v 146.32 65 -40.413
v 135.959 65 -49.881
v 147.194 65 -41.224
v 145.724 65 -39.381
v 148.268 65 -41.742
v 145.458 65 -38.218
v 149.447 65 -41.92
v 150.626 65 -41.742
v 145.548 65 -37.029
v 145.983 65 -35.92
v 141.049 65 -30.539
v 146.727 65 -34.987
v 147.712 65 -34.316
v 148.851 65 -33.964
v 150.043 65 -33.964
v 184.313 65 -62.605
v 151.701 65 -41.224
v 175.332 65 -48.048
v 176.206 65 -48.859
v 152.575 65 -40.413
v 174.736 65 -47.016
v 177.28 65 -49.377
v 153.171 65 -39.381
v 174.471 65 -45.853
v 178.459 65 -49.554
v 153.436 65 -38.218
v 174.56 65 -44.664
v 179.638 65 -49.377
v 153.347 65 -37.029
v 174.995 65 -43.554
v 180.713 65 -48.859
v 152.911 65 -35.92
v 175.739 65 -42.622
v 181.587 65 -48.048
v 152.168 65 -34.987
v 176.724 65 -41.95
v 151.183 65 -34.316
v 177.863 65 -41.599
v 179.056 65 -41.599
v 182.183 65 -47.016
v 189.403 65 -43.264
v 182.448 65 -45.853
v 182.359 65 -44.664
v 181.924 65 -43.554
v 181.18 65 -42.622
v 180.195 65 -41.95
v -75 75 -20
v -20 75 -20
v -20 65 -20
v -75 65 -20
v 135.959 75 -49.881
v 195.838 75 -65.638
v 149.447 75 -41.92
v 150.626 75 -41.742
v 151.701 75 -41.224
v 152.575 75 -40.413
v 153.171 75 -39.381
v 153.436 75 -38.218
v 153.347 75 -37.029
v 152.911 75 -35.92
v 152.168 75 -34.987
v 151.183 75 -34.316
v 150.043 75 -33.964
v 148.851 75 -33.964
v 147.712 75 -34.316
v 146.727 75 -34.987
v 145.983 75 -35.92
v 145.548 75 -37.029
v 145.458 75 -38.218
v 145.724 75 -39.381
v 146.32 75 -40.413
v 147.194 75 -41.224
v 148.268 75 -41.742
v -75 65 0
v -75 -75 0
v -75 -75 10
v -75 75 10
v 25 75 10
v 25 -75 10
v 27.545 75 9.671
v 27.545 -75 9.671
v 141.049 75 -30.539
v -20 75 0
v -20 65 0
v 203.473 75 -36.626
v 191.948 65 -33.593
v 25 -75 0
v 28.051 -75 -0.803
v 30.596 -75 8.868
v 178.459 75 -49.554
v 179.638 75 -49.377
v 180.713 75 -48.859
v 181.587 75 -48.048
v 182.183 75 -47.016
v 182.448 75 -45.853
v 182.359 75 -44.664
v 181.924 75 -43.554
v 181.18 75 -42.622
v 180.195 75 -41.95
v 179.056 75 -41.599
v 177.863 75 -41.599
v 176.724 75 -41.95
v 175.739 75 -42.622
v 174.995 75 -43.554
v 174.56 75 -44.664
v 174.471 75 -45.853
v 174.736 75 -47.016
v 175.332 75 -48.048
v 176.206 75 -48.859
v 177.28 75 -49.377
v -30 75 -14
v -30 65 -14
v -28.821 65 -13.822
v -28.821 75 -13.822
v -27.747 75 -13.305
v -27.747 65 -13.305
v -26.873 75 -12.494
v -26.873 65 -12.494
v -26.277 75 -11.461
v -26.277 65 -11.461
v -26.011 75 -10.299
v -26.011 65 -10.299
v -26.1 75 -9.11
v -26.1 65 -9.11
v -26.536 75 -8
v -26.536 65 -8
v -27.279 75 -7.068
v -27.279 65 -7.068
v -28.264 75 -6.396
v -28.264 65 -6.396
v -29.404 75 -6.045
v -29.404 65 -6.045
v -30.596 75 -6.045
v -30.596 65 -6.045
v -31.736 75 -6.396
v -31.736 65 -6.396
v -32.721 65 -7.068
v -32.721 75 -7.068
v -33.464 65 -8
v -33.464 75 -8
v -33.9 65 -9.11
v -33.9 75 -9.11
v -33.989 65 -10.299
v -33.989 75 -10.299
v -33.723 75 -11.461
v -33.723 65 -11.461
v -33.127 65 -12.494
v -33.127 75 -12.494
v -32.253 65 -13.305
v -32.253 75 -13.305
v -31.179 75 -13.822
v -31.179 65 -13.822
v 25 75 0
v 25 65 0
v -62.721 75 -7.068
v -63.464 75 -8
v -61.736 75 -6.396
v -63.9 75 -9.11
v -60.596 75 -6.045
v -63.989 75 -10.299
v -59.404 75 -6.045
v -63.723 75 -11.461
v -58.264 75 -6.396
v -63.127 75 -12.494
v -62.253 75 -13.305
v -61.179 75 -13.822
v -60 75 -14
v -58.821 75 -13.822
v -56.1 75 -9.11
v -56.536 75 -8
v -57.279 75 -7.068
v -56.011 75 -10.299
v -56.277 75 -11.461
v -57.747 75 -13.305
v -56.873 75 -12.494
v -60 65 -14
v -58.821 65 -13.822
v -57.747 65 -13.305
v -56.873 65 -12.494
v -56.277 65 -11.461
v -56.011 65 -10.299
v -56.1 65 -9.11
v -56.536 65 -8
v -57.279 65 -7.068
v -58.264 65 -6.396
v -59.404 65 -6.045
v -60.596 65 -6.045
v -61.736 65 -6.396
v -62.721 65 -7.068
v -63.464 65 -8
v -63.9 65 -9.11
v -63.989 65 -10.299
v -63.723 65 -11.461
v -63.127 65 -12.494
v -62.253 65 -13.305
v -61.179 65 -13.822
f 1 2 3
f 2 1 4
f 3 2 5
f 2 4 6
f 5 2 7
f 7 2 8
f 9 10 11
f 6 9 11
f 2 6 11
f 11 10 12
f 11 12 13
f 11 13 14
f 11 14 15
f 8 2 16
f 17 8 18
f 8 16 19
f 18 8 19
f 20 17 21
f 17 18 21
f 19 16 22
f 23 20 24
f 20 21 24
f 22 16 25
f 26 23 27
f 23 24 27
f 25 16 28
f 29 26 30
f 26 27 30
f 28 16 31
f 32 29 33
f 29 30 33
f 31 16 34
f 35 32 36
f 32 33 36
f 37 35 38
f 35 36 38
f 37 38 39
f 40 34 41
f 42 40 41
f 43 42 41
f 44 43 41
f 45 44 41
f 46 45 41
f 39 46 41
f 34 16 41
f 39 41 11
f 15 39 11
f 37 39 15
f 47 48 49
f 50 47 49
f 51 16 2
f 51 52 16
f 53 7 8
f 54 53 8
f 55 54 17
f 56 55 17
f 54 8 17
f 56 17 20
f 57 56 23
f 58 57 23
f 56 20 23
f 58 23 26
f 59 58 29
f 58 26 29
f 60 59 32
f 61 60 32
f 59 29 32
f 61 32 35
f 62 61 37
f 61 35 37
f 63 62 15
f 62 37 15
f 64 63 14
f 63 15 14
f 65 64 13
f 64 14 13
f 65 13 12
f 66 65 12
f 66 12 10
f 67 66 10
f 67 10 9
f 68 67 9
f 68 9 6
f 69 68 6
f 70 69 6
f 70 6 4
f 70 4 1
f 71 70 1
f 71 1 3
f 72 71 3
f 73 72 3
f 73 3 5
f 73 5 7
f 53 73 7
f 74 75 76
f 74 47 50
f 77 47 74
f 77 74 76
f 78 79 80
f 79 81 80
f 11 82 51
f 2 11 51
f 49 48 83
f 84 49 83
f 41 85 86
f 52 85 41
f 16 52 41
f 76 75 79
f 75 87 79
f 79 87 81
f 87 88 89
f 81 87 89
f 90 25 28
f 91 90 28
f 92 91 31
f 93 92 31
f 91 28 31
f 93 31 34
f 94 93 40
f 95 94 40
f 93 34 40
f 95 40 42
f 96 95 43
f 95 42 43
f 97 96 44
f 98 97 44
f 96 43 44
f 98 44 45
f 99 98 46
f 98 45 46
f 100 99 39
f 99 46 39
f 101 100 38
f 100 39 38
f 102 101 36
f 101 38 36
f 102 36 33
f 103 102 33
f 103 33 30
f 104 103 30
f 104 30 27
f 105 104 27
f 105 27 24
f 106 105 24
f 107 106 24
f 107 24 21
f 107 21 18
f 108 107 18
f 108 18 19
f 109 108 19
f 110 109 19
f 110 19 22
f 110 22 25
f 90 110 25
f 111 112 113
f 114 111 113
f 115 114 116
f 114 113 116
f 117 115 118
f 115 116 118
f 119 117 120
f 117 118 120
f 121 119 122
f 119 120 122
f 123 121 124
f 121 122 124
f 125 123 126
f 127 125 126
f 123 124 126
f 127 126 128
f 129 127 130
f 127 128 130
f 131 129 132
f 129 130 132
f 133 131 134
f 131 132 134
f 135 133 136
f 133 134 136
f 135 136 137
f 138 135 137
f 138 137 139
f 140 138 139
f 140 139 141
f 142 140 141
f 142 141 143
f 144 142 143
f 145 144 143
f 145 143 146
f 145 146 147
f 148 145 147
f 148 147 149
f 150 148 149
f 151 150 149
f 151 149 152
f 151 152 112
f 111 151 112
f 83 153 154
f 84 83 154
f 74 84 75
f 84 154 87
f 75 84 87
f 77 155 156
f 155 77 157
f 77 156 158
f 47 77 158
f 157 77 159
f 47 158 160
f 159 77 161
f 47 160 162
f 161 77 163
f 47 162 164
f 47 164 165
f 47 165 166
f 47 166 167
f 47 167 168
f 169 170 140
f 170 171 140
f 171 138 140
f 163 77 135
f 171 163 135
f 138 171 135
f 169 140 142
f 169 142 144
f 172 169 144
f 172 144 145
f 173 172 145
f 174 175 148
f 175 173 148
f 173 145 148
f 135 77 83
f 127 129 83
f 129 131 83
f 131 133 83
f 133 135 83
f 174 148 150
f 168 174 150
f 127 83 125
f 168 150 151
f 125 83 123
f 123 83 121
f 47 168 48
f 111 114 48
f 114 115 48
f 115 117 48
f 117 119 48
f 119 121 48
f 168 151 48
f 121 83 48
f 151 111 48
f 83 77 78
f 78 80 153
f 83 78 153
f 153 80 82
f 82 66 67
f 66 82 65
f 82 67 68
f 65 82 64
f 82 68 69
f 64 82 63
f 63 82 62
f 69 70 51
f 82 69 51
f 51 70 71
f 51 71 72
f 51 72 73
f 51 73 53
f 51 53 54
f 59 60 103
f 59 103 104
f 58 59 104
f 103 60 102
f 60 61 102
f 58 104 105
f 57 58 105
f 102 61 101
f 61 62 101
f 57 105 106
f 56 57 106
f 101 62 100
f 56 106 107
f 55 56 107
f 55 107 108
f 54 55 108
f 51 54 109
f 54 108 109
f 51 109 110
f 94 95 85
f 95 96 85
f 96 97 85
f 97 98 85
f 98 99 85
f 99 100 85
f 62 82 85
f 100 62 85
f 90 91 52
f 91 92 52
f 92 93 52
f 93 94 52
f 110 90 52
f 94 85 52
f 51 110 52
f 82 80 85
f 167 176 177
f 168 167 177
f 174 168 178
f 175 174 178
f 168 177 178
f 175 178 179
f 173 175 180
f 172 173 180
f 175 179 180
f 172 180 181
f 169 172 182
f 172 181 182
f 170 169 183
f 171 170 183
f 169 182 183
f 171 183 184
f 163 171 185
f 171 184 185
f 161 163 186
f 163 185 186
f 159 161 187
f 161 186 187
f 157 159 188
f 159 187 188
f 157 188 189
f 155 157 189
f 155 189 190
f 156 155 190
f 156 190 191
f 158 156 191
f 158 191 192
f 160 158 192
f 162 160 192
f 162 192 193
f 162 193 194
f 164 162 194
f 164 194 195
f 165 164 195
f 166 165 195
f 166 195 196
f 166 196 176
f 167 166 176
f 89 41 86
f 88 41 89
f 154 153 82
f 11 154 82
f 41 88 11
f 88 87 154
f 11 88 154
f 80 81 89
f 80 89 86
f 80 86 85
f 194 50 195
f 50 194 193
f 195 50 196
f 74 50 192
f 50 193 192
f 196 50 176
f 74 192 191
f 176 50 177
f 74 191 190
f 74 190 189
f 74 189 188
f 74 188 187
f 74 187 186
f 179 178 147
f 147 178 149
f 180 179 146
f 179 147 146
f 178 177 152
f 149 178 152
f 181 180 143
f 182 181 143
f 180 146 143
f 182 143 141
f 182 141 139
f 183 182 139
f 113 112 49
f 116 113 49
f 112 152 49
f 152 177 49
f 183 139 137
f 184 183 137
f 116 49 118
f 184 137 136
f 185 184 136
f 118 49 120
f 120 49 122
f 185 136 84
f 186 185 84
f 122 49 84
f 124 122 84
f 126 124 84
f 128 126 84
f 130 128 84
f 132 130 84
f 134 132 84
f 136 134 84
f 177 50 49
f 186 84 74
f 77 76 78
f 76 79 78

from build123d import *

# Parameters (mm, degrees)
SKETCH_1_W          = 50
SKETCH_1_H          = 150
EXTRUDE_1_DEPTH     = 10
SKETCH_3_W          = 10
SKETCH_3_H          = 150
EXTRUDE_2_DEPTH     = 280
EXTRUDE_3_DEPTH     = 10
CUT_EXTRUDE_1_DEPTH = 50
EXTRUDE_4_DEPTH     = 50
SKETCH_9_R          = 4
CUT_EXTRUDE_2_DEPTH = 30
CUT_EXTRUDE_4_DEPTH = 10


with BuildPart() as part:
    # 草图1 → 凸台-拉伸1 (new body)
    with BuildSketch(Plane.XY):
        Rectangle(SKETCH_1_W, SKETCH_1_H)
    extrude(amount=EXTRUDE_1_DEPTH)



with BuildPart() as body_2:
    # 草图3 → 凸台-拉伸2 (new body)
    with BuildSketch(Plane(origin=(25, 75, 0), x_dir=(-0.2544932992796438, 0, -0.9670745372626465), z_dir=(0.9670745372626465, 0, -0.2544932992796438))):
        with Locations((-5, -75)):
            Rectangle(SKETCH_3_W, SKETCH_3_H)
    extrude(amount=EXTRUDE_2_DEPTH)


with BuildPart() as part_1:
    add(part.part)

    add(body_2.part)  # 放样8 merges body 2
    # 草图4 → 放样8 section 0
    with BuildSketch(Plane(origin=(25, 0, 0), x_dir=(0, 0, -1), z_dir=(1, 0, 0))):
        with BuildLine():
            Line((-10, 75), (0, 75))
            Line((0, 75), (0, -75))
            Line((0, -75), (-10, -75))
            Line((-10, -75), (-10, 75))
        make_face()
    # 草图5 → 放样8 section 1
    with BuildSketch(Plane(origin=(23.380829016, 0, -6.152849741), x_dir=(0.25449329927964376, 0, 0.9670745372626466), z_dir=(-0.9670745372626466, 0, 0.25449329927964376))):
        with BuildLine():
            Line((6.362332482, 75), (16.362332482, 75))
            Line((16.362332482, 75), (16.362332482, -75))
            Line((16.362332482, -75), (6.362332482, -75))
            Line((6.362332482, -75), (6.362332482, 75))
        make_face()
    loft()

    # 草图6 → 凸台-拉伸3 (add)
    with BuildSketch(Plane(origin=(0, 75, 0), x_dir=(1, 0, 0), z_dir=(0, 1, 0))):
        Polygon((25, 0), (295.780870434, 71.258123798), (290.691004448, 90.599614544), (22.412469182, 20), (-25, 20), (-25, 0), align=None)
    extrude(amount=-EXTRUDE_3_DEPTH)

    # 草图7 → 切除-拉伸1 (cut, symmetric)
    with BuildSketch(Plane(origin=(1.619170984, 0, 6.152849741), x_dir=(-0.9670745372626465, 0, 0.2544932992796438), z_dir=(-0.2544932992796438, 0, -0.9670745372626465))):
        Polygon((-194.176863432, 65), (-24.176863432, -77.6469373), (26.721796424, -75), (44.26157498, -115.472113567), (-316.323525899, -105.286880986), (-321.035103343, 79.29609417), (-302.302762067, 102.681692196), (-235.315396996, 89.416867429), (-227.148078723, 92.666134591), align=None)
    extrude(amount=CUT_EXTRUDE_1_DEPTH, both=True, mode=Mode.SUBTRACT)

    # 草图8 → 凸台-拉伸4 (add)
    with BuildSketch(Plane.ZY.offset(25)):
        Polygon((0, 65), (0, -75), (10, -75), (10, 75), (-20, 75), (-20, 65), align=None)
    extrude(amount=EXTRUDE_4_DEPTH)

    # 草图9 → 切除-拉伸2 (cut)
    with BuildSketch(Plane.XZ.offset(-65)):
        with Locations(Location((-60, -10, 0), (0, 0, 270))):
            Circle(SKETCH_9_R)
        with Locations(Location((-30, -10, 0), (0, 0, 270))):
            Circle(SKETCH_9_R)
        with Locations(Location((178.459459466, -45.554300571, 0), (0, 0, 270))):
            Circle(SKETCH_9_R)
        with Locations(Location((149.447223348, -37.919501593, 0), (0, 0, 270))):
            Circle(SKETCH_9_R)
    extrude(amount=-CUT_EXTRUDE_2_DEPTH, mode=Mode.SUBTRACT)

    # 草图10 → 切除-拉伸4 (cut)
    with BuildSketch(Plane(origin=(0, 75, 0), x_dir=(1, 0, 0), z_dir=(0, 1, 0))):
        Polygon((141.048944472, 30.539195914), (135.959078486, 49.880686659), (22.412469182, 20), (-20, 20), (-20, 0), (25, 0), align=None)
    extrude(amount=-CUT_EXTRUDE_4_DEPTH, mode=Mode.SUBTRACT)


solid = part_1.part
